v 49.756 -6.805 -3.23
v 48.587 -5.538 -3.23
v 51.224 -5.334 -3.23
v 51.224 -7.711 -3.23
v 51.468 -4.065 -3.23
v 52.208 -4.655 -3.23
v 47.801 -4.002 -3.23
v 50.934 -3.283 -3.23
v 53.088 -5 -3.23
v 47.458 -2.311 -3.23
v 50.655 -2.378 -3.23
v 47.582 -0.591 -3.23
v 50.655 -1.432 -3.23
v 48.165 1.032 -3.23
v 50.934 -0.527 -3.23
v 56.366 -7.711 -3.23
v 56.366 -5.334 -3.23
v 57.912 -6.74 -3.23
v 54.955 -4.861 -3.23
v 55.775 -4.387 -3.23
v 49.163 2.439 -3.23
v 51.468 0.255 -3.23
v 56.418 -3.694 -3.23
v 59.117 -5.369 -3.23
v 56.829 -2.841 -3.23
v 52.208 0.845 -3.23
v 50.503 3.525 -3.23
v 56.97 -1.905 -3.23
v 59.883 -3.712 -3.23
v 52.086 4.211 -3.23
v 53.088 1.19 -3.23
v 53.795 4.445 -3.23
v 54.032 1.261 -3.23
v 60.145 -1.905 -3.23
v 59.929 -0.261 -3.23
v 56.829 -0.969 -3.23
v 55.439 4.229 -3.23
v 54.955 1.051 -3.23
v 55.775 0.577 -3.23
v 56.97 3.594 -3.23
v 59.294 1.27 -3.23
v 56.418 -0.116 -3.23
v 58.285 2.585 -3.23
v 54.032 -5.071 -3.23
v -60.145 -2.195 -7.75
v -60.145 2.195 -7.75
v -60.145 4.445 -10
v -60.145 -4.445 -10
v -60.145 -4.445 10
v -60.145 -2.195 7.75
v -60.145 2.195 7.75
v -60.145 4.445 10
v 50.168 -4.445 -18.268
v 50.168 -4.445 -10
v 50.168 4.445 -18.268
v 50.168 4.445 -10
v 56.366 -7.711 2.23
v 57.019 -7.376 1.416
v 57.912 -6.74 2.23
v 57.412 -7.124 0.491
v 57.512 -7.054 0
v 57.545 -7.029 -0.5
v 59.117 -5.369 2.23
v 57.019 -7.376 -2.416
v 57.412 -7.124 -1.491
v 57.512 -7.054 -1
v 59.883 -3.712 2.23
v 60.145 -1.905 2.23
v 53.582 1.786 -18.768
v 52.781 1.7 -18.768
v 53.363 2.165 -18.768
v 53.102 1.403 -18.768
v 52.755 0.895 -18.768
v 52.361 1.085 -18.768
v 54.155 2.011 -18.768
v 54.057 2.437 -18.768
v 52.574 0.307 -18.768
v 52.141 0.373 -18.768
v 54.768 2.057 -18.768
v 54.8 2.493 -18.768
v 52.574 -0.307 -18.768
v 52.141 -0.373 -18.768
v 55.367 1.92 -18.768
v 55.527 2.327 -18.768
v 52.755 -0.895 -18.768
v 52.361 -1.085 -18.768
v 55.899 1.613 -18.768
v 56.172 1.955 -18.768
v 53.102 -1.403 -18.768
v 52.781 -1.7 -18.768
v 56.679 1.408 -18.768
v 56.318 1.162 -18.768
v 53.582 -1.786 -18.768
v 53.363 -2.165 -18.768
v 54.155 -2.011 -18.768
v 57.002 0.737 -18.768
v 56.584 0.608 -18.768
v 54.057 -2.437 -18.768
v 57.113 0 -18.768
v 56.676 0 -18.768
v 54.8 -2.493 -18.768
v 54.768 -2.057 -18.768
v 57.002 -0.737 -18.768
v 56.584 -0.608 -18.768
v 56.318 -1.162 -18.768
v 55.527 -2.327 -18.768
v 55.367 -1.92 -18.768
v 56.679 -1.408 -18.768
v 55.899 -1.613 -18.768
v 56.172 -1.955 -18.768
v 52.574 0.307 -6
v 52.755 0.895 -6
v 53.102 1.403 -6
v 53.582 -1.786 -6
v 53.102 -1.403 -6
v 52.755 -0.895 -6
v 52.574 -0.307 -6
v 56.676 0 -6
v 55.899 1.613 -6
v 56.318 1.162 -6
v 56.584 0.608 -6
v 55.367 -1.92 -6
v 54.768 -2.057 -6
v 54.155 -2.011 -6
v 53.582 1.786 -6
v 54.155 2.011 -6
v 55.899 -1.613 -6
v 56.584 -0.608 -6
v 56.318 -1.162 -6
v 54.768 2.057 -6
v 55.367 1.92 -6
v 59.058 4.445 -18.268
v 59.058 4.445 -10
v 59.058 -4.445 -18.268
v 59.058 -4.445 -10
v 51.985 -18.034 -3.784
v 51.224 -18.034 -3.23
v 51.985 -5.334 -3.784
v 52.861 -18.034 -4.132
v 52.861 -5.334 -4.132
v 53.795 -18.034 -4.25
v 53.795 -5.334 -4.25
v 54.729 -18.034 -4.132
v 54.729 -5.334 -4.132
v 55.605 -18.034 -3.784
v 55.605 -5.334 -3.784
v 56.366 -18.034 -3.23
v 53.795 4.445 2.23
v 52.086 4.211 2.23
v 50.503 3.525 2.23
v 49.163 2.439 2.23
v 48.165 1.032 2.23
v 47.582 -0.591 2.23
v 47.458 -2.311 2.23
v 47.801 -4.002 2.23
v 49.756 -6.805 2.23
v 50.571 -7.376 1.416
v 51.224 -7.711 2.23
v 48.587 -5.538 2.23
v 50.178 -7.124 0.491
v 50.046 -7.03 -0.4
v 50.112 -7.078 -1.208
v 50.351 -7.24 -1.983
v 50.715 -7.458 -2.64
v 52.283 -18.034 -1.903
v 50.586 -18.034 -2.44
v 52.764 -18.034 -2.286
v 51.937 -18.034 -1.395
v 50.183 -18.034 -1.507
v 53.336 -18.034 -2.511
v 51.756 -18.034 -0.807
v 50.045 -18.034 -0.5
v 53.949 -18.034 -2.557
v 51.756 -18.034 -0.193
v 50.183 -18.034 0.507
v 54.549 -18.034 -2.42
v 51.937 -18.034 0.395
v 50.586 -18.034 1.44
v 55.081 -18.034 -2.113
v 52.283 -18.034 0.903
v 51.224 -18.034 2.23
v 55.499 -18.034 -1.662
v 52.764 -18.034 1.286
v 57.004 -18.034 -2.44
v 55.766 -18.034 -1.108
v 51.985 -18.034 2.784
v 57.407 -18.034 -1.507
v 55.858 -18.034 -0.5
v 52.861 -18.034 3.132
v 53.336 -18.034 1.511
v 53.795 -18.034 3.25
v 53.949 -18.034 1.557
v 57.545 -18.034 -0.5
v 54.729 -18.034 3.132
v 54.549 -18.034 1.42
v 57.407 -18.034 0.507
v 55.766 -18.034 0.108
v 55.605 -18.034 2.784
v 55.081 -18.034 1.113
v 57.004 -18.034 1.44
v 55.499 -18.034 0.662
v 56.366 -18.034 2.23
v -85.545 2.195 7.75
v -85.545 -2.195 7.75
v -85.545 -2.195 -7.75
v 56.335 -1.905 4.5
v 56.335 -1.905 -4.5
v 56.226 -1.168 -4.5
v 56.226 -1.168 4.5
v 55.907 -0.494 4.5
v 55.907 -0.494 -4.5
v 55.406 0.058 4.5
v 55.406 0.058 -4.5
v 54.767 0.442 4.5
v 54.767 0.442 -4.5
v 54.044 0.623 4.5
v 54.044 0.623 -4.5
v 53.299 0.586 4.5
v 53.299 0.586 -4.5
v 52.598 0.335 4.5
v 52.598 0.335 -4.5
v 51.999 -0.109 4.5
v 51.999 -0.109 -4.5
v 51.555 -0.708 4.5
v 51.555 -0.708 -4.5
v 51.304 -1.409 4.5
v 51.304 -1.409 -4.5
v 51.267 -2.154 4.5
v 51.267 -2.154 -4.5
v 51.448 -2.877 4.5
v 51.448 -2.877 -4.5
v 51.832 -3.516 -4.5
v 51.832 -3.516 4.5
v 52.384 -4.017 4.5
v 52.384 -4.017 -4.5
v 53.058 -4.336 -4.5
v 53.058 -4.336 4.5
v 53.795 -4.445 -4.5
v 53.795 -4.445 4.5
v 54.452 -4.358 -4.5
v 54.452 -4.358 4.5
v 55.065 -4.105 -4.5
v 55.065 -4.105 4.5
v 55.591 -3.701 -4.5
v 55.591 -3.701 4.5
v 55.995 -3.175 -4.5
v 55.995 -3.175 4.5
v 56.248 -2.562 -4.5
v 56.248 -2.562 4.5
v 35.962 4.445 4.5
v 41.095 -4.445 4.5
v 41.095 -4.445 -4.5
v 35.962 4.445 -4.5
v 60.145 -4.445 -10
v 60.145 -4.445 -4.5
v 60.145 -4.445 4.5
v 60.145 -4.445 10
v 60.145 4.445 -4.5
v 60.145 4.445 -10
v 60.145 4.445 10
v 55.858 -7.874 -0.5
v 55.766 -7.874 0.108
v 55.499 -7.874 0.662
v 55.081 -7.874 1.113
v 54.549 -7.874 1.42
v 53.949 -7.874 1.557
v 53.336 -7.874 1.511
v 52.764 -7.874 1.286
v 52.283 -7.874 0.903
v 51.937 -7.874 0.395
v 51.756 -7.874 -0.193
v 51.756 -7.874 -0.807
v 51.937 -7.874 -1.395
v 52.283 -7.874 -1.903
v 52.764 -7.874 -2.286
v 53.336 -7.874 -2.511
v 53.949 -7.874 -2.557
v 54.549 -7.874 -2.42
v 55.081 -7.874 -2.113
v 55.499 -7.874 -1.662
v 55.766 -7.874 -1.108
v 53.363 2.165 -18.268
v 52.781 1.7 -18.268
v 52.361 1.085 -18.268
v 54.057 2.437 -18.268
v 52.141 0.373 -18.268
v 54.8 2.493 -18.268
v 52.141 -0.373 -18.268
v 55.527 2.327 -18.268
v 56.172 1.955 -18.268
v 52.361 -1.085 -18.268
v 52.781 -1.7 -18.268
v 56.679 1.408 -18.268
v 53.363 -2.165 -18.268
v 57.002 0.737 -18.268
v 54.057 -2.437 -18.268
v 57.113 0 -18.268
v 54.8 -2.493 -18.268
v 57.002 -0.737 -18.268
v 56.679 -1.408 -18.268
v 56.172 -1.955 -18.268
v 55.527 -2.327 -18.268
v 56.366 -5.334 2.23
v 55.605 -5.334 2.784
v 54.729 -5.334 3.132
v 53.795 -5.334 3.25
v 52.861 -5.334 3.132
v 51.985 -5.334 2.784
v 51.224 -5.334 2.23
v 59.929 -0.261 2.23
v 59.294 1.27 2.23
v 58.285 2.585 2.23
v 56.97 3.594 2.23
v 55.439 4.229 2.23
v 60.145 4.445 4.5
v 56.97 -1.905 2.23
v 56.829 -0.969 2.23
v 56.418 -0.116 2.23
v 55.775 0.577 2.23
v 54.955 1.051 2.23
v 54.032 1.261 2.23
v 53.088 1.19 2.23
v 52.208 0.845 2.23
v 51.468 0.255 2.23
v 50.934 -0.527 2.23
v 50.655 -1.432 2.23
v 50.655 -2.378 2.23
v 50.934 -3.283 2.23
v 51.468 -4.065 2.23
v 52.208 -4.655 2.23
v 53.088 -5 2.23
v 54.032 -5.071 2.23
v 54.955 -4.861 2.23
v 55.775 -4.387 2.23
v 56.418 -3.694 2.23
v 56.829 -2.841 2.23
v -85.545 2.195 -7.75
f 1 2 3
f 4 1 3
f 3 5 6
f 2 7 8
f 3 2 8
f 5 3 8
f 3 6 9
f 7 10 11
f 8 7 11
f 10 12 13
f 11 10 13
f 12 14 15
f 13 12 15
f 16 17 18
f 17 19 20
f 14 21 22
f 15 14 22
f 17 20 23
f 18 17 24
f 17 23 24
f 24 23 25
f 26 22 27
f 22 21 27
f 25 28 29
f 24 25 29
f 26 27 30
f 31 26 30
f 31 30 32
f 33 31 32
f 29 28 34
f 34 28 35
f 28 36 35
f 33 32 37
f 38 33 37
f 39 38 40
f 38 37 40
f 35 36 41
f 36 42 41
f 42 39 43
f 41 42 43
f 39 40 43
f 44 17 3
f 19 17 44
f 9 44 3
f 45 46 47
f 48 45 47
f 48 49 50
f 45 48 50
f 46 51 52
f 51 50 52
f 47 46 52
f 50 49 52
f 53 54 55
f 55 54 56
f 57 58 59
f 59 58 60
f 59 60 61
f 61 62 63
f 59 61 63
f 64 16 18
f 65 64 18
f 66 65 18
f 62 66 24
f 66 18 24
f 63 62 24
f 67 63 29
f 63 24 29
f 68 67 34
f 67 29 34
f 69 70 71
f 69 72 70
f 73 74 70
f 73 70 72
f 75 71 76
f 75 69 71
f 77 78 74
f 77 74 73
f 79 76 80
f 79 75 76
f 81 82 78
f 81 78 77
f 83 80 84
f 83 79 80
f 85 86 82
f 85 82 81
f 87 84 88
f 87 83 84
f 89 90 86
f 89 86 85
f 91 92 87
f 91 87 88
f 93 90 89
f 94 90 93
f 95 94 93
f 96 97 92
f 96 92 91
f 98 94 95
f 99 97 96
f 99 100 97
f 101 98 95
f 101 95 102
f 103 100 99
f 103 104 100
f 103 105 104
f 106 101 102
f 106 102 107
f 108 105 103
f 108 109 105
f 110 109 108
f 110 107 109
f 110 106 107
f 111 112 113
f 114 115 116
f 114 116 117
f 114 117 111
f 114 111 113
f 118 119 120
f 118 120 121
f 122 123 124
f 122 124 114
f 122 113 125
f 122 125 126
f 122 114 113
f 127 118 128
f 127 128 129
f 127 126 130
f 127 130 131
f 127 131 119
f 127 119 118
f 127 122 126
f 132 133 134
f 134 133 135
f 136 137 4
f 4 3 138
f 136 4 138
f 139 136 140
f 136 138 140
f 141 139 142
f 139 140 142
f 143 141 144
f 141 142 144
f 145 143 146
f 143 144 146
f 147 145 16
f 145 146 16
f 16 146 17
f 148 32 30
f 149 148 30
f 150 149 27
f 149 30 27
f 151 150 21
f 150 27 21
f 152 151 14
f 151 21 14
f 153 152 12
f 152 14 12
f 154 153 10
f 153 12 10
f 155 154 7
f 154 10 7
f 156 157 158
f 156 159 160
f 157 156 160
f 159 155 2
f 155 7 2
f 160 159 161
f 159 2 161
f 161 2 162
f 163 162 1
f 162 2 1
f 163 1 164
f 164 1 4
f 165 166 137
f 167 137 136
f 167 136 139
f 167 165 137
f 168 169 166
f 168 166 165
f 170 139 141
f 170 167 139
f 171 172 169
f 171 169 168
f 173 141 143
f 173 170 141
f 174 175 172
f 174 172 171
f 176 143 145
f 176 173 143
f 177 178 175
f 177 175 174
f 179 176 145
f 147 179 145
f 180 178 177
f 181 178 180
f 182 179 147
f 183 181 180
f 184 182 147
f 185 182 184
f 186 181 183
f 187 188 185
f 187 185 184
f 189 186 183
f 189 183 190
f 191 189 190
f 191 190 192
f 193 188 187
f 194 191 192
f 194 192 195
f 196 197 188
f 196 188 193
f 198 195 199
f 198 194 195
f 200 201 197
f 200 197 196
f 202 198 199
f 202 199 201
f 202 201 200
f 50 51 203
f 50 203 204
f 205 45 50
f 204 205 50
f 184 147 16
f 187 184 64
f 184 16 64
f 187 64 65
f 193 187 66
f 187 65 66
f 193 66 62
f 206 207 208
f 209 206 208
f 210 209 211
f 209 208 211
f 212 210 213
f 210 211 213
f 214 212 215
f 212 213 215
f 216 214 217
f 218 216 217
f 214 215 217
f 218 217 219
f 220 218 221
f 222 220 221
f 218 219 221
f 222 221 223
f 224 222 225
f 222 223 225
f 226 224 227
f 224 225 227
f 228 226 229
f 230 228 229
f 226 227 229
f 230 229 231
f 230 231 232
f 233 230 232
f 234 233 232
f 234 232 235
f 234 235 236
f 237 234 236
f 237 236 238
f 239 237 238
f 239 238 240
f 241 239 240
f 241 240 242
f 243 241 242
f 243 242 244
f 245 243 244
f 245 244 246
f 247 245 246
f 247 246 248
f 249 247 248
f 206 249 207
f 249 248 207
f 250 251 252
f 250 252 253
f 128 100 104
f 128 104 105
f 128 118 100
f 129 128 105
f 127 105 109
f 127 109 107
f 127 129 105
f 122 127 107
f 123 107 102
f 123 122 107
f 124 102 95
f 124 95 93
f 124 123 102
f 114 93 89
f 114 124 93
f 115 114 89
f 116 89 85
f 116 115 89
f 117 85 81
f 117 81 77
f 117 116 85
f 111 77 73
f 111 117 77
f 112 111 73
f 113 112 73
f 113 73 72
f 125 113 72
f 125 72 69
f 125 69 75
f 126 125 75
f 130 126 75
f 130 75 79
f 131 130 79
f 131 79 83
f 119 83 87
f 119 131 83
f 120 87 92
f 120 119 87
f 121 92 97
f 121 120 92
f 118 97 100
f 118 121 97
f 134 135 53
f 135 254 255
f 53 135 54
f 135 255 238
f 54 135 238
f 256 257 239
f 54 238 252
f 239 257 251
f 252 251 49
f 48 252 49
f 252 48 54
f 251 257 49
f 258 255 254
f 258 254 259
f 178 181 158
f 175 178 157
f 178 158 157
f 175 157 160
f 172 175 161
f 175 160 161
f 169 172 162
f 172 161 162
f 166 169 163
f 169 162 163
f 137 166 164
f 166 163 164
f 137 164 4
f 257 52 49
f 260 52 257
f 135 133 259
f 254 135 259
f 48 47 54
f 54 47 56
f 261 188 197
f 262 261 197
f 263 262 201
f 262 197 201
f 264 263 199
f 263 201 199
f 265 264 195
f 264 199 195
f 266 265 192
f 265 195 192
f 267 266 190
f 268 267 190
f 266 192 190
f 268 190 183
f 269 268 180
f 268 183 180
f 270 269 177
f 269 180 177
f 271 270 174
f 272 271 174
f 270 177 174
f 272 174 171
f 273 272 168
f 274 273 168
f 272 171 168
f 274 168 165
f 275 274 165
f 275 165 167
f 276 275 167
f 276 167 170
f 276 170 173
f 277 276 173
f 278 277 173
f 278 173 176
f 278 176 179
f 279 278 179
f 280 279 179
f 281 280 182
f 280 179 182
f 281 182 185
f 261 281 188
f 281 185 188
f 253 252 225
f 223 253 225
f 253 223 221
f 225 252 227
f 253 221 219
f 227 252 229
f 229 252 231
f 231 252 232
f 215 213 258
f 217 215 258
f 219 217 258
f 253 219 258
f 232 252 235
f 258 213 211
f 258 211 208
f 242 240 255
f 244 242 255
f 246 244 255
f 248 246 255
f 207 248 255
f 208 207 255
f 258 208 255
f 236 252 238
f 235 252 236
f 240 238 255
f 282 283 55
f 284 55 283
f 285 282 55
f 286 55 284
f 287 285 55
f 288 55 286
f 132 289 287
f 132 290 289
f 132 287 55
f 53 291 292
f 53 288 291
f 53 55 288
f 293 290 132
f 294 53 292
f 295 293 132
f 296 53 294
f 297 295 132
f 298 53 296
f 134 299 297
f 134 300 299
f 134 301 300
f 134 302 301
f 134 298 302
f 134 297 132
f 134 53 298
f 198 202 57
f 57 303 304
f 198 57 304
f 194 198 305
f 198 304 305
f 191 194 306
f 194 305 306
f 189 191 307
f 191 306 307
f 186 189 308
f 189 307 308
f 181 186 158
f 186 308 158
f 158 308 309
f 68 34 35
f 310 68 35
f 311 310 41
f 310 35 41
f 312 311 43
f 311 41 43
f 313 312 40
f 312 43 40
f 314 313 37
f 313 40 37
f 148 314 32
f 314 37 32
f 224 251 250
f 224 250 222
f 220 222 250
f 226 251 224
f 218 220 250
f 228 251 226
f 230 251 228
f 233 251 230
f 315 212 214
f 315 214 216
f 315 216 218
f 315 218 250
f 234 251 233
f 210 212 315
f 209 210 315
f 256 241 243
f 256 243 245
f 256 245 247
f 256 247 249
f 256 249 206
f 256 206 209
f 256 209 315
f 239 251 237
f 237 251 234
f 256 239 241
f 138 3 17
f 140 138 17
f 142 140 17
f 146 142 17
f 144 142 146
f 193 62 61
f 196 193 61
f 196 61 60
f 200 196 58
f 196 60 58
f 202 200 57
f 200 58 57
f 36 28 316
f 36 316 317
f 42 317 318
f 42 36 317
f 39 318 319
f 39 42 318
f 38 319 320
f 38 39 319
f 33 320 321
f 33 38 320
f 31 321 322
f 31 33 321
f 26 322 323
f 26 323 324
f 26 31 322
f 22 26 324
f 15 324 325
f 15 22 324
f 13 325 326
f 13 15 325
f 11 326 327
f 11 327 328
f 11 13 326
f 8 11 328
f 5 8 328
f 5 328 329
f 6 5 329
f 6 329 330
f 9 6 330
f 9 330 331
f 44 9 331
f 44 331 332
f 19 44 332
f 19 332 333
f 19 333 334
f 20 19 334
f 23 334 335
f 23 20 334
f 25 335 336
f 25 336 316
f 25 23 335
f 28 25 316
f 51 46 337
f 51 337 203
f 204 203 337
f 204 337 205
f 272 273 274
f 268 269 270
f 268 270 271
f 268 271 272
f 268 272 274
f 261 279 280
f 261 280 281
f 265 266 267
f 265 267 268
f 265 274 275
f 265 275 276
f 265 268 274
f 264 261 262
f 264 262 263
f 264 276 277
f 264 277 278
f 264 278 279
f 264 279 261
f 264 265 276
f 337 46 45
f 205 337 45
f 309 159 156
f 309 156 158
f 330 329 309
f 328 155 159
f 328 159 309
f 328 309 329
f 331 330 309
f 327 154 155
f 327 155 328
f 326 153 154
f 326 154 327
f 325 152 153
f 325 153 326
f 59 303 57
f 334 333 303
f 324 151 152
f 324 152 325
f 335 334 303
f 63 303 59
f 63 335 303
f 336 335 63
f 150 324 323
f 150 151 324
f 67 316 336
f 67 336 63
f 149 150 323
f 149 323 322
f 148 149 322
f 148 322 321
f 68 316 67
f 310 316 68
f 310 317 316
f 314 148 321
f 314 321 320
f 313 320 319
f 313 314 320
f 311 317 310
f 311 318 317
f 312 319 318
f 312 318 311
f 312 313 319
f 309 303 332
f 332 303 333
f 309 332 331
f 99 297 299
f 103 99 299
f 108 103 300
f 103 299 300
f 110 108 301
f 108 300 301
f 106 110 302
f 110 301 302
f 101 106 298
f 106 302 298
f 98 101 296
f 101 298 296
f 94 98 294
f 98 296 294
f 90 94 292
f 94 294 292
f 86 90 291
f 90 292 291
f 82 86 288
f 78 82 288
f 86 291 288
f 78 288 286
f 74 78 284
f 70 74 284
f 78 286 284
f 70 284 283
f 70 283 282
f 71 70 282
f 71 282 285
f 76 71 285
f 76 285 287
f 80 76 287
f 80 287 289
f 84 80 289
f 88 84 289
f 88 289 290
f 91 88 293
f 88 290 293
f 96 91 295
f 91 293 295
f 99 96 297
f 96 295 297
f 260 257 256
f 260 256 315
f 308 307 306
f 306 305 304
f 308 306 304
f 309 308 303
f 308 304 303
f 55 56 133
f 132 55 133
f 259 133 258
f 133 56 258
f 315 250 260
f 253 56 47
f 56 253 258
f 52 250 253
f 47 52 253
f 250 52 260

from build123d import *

# Parameters (mm, degrees)
F0_W      = 120.2900058
F0_H      = 8.89
F1_DEPTH  = 10
F2_W      = 4.39
F2_H      = 15.5
F3_DEPTH  = 25.4
F4_W      = 19.05
F4_H      = 9
F5_DEPTH  = 8.891
F6_R      = 2.54
F7_DEPTH  = 9
F9_R      = 3.175
F10_DEPTH = 5.46
F13_DEPTH = 12.7
F14_R     = 2.0625
F15_DEPTH = 10.16
F16_R     = 2.0625
F17_DEPTH = 4
F18_R     = 2.0625
F19_DEPTH = 8.267699999
F20_R     = 2.5
F20_R_2   = 2.0625
F21_DEPTH = 0.5
F23_DEPTH = 9


with BuildPart() as f1:
    # F0 (on Top) → F1 (new body, symmetric)
    with BuildSketch(Plane.XY):
        Rectangle(F0_W, F0_H)
    extrude(amount=F1_DEPTH, both=True)

    # F2 (on face) → F3 (join)
    with BuildSketch(Plane(origin=(-60.1450029, 0, 0), x_dir=(0, -1, 0), z_dir=(-1, 0, 0))):
        Rectangle(F2_W, F2_H)
    extrude(amount=F3_DEPTH)

    # F4 (on face) → F5 (cut, through all)
    with BuildSketch(Plane.XZ.offset(4.445)):
        with Locations((50.6200029, 0)):
            Rectangle(F4_W, F4_H)
    extrude(amount=-F5_DEPTH, mode=Mode.SUBTRACT)

    # F6 (on face) → F7 (join, through all)
    with BuildSketch(Plane.XY.offset(-4.5)):
        with Locations((53.7950029, -1.905)):
            Circle(F6_R)
    extrude(amount=F7_DEPTH)

    # F16 (on face) → F17 (cut)
    with BuildSketch(Plane(origin=(0, 0, -10), x_dir=(1, 0, 0), z_dir=(0, 0, -1))):
        with Locations((54.6134511488, 0)):
            Circle(F16_R)
    extrude(amount=-F17_DEPTH, mode=Mode.SUBTRACT)

    # F18 (on face) → F19 (join)
    with BuildSketch(Plane(origin=(0, 0, -10), x_dir=(1, 0, 0), z_dir=(0, 0, -1))):
        with BuildLine():
            ThreePointArc((54.6134511488, -4.445), (57.7565407912, -3.1430896424), (59.0584511488, 0))
            ThreePointArc((59.0584511488, 0), (57.7565407912, 3.1430896424), (54.6134511488, 4.445))
            ThreePointArc((54.6134511488, 4.445), (51.4703615087, 3.1430896446), (50.1684511488, 6.4e-09))
            ThreePointArc((50.1684511488, 6.4e-09), (51.4703615042, -3.1430896401), (54.6134511488, -4.445))
        make_face()
        with Locations((54.6134511488, 0)):
            Circle(F18_R, mode=Mode.SUBTRACT)
        with BuildLine():
            Line((59.0584511488, -4.445), (59.0584511488, 0))
            ThreePointArc((59.0584511488, 0), (57.7565407912, -3.1430896424), (54.6134511488, -4.445))
            Line((54.6134511488, -4.445), (59.0584511488, -4.445))
        make_face()
        with BuildLine():
            ThreePointArc((54.6134511488, 4.445), (57.7565407912, 3.1430896424), (59.0584511488, 0))
            Line((59.0584511488, 0), (59.0584511488, 4.445))
            Line((59.0584511488, 4.445), (54.6134511488, 4.445))
        make_face()
        with BuildLine():
            ThreePointArc((50.1684511488, 6.4e-09), (51.4703615087, 3.1430896446), (54.6134511488, 4.445))
            Line((54.6134511488, 4.445), (50.1684511488, 4.445))
            Line((50.1684511488, 4.445), (50.1684511488, 6.4e-09))
        make_face()
        with BuildLine():
            Line((50.1684511488, -4.445), (54.6134511488, -4.445))
            ThreePointArc((54.6134511488, -4.445), (51.4703615042, -3.1430896401), (50.1684511488, 6.4e-09))
            Line((50.1684511488, 6.4e-09), (50.1684511488, -4.445))
        make_face()
    extrude(amount=F19_DEPTH)

    # F20 (on face) → F21 (join)
    with BuildSketch(Plane(origin=(0, 0, -18.267699999), x_dir=(1, 0, 0), z_dir=(0, 0, -1))):
        with Locations((54.6134511488, 0)):
            Circle(F20_R)
        with Locations((54.6134511488, 0)):
            Circle(F20_R_2, mode=Mode.SUBTRACT)
    extrude(amount=F21_DEPTH)

    # F22 (on face) → F23 (cut)
    with BuildSketch(Plane(origin=(0, 0, 4.5), x_dir=(1, 0, 0), z_dir=(0, 0, -1))):
        Polygon((41.0950029, -4.445), (41.0950029, 4.445), (35.9623590069, -4.445), align=None)
    extrude(amount=F23_DEPTH, mode=Mode.SUBTRACT)


with BuildPart() as f10:
    # F9 (on offset) → F10 (new body)
    with BuildSketch(Plane.XY.offset(-3.23)):
        with BuildLine():
            ThreePointArc((53.7950029, 4.445), (49.3048748395, -6.3951280605), (60.1450029, -1.905))
            ThreePointArc((60.1450029, -1.905), (58.2851309605, 2.5851280605), (53.7950029, 4.445))
        make_face()
        with Locations((53.7950029, -1.905)):
            Circle(F9_R, mode=Mode.SUBTRACT)
    extrude(amount=F10_DEPTH)

    # F12 (on offset) → F13 (join)
    with BuildSketch(Plane.XZ.offset(5.334)):
        with BuildLine():
            ThreePointArc((51.2240886657, -3.23), (53.7950029, -4.25), (56.3659171343, -3.23))
            Line((56.3659171343, -3.23), (51.2240886657, -3.23))
        make_face()
        with BuildLine():
            Line((51.2240886657, -3.23), (56.3659171343, -3.23))
            ThreePointArc((56.3659171343, -3.23), (57.2376347696, -1.986871148), (57.5450029, -0.5))
            ThreePointArc((57.5450029, -0.5), (57.2376347696, 0.986871148), (56.3659171343, 2.23))
            Line((56.3659171343, 2.23), (51.2240886657, 2.23))
            ThreePointArc((51.2240886657, 2.23), (50.0450029, -0.5), (51.2240886657, -3.23))
        make_face()
        with BuildLine():
            ThreePointArc((56.3659171343, 2.23), (53.7950029, 3.25), (51.2240886657, 2.23))
            Line((51.2240886657, 2.23), (56.3659171343, 2.23))
        make_face()
    extrude(amount=F13_DEPTH)

    # F14 (on face) → F15 (cut)
    with BuildSketch(Plane.XZ.offset(18.034)):
        with Locations((53.7950029, -0.5)):
            Circle(F14_R)
    extrude(amount=-F15_DEPTH, mode=Mode.SUBTRACT)


solid = Compound([f1.part, f10.part])
